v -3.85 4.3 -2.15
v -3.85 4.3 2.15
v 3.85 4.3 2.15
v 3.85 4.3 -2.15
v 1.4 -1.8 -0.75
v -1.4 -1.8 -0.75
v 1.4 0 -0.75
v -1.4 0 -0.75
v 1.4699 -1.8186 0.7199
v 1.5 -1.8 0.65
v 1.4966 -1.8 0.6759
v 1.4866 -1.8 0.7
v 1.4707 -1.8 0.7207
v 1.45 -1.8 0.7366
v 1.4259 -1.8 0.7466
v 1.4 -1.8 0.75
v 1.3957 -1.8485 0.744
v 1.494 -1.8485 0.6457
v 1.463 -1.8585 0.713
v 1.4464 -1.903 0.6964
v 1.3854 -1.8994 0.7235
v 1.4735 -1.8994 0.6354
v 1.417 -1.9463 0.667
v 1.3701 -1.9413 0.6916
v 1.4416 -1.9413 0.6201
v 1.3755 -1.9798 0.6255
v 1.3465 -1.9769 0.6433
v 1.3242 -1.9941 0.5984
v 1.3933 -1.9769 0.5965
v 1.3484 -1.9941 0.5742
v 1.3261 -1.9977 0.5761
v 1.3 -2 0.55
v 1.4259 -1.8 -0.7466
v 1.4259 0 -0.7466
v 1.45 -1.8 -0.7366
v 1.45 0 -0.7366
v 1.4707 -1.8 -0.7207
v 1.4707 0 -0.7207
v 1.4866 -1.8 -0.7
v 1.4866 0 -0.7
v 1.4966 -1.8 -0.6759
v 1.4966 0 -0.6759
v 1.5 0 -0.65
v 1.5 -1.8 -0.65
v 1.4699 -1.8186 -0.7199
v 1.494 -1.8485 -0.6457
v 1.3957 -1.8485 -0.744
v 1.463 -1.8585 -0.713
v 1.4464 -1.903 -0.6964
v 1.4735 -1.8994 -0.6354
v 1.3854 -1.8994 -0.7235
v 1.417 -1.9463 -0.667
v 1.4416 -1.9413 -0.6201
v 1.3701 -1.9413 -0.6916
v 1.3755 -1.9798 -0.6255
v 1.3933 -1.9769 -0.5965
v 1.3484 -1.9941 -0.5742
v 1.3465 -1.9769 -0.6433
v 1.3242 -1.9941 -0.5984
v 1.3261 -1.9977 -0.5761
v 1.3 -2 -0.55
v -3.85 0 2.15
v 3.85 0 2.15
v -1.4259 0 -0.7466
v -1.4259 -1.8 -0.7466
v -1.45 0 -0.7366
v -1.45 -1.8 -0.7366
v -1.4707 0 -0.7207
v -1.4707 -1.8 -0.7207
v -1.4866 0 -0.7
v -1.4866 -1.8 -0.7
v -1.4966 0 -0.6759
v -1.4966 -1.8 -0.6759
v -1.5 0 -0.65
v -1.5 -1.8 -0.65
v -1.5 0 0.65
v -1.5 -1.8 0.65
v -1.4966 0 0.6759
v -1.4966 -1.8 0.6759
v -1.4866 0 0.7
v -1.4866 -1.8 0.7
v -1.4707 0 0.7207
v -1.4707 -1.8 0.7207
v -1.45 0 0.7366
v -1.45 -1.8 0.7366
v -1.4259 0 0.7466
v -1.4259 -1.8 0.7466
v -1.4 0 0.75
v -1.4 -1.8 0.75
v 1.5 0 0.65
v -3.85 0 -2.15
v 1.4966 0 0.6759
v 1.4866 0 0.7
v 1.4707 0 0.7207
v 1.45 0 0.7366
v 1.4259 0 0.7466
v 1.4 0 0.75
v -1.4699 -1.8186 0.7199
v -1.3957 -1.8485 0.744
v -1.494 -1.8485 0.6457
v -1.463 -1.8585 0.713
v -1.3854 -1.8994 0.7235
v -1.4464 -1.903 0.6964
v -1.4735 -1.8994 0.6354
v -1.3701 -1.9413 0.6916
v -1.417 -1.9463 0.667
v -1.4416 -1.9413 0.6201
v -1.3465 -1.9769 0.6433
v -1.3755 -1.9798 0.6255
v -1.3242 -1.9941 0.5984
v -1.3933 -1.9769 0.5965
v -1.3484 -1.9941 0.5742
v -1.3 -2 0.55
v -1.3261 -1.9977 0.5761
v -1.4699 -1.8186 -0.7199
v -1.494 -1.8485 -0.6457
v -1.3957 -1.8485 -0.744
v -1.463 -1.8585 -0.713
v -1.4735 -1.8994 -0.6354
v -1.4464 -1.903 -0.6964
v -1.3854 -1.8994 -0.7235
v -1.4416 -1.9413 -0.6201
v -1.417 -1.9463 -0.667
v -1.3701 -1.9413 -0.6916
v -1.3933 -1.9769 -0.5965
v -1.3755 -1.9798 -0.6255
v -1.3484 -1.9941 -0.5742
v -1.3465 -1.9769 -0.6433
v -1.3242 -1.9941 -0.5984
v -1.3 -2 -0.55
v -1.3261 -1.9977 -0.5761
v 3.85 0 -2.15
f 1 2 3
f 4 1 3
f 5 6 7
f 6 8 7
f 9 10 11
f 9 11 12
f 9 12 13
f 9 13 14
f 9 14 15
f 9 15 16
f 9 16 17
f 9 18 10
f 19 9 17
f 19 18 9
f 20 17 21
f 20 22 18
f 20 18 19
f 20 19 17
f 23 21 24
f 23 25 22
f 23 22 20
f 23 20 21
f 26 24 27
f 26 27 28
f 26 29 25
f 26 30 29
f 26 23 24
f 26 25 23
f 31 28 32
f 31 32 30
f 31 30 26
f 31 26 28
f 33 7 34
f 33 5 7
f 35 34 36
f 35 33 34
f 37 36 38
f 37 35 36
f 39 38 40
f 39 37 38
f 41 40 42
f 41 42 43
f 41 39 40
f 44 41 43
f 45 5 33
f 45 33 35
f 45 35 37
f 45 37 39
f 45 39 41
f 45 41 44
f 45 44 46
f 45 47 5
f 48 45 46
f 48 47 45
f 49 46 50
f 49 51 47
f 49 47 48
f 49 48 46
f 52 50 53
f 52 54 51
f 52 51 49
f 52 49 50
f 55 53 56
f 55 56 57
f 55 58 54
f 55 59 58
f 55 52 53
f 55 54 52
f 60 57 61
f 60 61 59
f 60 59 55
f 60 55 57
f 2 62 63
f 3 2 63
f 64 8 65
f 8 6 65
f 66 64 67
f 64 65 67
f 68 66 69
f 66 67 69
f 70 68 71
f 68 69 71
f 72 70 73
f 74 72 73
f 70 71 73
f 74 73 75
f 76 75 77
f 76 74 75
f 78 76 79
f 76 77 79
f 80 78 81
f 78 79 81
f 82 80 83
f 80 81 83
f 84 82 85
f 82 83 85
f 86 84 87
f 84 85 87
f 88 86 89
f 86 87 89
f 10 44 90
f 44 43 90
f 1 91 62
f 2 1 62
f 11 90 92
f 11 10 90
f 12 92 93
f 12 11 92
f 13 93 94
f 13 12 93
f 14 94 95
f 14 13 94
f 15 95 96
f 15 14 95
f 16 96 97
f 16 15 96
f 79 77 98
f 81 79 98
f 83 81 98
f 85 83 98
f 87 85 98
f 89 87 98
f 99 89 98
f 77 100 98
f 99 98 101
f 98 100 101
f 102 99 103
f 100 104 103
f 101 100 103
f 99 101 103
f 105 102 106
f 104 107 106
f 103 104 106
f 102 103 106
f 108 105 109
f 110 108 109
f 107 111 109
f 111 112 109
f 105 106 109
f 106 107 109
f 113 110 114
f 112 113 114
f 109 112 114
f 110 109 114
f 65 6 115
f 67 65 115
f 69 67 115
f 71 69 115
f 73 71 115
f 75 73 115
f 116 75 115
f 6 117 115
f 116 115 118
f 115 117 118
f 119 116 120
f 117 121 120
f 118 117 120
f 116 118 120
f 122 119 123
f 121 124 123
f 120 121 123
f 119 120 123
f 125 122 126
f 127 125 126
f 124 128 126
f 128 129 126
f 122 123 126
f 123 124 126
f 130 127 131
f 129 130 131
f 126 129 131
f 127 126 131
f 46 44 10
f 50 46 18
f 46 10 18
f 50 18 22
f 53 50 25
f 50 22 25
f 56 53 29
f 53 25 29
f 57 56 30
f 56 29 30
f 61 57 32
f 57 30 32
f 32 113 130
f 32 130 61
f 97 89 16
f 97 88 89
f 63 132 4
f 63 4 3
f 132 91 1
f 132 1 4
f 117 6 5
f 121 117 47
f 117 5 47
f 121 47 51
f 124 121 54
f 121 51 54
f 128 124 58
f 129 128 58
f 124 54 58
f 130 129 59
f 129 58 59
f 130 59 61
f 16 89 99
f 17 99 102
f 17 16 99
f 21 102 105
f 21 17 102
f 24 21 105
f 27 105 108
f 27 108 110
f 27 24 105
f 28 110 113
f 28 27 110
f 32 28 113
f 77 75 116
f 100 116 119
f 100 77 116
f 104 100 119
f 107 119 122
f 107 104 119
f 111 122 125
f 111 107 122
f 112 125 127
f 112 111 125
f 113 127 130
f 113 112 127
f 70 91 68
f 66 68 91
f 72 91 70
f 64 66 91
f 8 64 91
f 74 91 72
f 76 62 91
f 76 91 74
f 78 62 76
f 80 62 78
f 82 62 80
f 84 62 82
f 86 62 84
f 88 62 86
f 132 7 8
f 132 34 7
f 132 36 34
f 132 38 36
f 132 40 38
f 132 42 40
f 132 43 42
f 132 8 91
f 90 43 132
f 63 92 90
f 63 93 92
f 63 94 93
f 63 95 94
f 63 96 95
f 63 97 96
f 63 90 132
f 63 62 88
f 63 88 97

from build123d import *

# Parameters (mm, degrees)
F0_W     = 7.7
F0_H     = 4.3
F0_W_2   = 3
F0_H_2   = 1.5
F1_DEPTH = 4.3
F2_DEPTH = 2
F3_R     = 0.2
F4_R     = 0.1


with BuildPart() as f1:
    # F0 (on Front) → F1 (new body)
    with BuildSketch(Plane.XZ):
        Rectangle(F0_W, F0_H)
        Rectangle(F0_W_2, F0_H_2, mode=Mode.SUBTRACT)
        Rectangle(F0_W_2, F0_H_2)
    extrude(amount=-F1_DEPTH)

    # F0 (on Front) → F2 (join)
    with BuildSketch(Plane.XZ):
        Rectangle(F0_W_2, F0_H_2)
    extrude(amount=F2_DEPTH)

    # F3
    f3_edges = [f1.edges().sort_by_distance(p)[0] for p in [
        (0, -2, 0.75),
        (1.5, -2, 0),
        (0, -2, -0.75),
        (-1.5, -2, 0),
    ]]
    fillet(f3_edges, radius=F3_R)

    # F4
    f4_edges = [f1.edges().sort_by_distance(p)[0] for p in [
        (1.42921, -1.952659, 0.67921),
        (1.42921, -1.952659, -0.67921),
        (-1.42921, -1.952659, -0.67921),
        (-1.42921, -1.952659, 0.67921),
    ]]
    fillet(f4_edges, radius=F4_R)


solid = f1.part
